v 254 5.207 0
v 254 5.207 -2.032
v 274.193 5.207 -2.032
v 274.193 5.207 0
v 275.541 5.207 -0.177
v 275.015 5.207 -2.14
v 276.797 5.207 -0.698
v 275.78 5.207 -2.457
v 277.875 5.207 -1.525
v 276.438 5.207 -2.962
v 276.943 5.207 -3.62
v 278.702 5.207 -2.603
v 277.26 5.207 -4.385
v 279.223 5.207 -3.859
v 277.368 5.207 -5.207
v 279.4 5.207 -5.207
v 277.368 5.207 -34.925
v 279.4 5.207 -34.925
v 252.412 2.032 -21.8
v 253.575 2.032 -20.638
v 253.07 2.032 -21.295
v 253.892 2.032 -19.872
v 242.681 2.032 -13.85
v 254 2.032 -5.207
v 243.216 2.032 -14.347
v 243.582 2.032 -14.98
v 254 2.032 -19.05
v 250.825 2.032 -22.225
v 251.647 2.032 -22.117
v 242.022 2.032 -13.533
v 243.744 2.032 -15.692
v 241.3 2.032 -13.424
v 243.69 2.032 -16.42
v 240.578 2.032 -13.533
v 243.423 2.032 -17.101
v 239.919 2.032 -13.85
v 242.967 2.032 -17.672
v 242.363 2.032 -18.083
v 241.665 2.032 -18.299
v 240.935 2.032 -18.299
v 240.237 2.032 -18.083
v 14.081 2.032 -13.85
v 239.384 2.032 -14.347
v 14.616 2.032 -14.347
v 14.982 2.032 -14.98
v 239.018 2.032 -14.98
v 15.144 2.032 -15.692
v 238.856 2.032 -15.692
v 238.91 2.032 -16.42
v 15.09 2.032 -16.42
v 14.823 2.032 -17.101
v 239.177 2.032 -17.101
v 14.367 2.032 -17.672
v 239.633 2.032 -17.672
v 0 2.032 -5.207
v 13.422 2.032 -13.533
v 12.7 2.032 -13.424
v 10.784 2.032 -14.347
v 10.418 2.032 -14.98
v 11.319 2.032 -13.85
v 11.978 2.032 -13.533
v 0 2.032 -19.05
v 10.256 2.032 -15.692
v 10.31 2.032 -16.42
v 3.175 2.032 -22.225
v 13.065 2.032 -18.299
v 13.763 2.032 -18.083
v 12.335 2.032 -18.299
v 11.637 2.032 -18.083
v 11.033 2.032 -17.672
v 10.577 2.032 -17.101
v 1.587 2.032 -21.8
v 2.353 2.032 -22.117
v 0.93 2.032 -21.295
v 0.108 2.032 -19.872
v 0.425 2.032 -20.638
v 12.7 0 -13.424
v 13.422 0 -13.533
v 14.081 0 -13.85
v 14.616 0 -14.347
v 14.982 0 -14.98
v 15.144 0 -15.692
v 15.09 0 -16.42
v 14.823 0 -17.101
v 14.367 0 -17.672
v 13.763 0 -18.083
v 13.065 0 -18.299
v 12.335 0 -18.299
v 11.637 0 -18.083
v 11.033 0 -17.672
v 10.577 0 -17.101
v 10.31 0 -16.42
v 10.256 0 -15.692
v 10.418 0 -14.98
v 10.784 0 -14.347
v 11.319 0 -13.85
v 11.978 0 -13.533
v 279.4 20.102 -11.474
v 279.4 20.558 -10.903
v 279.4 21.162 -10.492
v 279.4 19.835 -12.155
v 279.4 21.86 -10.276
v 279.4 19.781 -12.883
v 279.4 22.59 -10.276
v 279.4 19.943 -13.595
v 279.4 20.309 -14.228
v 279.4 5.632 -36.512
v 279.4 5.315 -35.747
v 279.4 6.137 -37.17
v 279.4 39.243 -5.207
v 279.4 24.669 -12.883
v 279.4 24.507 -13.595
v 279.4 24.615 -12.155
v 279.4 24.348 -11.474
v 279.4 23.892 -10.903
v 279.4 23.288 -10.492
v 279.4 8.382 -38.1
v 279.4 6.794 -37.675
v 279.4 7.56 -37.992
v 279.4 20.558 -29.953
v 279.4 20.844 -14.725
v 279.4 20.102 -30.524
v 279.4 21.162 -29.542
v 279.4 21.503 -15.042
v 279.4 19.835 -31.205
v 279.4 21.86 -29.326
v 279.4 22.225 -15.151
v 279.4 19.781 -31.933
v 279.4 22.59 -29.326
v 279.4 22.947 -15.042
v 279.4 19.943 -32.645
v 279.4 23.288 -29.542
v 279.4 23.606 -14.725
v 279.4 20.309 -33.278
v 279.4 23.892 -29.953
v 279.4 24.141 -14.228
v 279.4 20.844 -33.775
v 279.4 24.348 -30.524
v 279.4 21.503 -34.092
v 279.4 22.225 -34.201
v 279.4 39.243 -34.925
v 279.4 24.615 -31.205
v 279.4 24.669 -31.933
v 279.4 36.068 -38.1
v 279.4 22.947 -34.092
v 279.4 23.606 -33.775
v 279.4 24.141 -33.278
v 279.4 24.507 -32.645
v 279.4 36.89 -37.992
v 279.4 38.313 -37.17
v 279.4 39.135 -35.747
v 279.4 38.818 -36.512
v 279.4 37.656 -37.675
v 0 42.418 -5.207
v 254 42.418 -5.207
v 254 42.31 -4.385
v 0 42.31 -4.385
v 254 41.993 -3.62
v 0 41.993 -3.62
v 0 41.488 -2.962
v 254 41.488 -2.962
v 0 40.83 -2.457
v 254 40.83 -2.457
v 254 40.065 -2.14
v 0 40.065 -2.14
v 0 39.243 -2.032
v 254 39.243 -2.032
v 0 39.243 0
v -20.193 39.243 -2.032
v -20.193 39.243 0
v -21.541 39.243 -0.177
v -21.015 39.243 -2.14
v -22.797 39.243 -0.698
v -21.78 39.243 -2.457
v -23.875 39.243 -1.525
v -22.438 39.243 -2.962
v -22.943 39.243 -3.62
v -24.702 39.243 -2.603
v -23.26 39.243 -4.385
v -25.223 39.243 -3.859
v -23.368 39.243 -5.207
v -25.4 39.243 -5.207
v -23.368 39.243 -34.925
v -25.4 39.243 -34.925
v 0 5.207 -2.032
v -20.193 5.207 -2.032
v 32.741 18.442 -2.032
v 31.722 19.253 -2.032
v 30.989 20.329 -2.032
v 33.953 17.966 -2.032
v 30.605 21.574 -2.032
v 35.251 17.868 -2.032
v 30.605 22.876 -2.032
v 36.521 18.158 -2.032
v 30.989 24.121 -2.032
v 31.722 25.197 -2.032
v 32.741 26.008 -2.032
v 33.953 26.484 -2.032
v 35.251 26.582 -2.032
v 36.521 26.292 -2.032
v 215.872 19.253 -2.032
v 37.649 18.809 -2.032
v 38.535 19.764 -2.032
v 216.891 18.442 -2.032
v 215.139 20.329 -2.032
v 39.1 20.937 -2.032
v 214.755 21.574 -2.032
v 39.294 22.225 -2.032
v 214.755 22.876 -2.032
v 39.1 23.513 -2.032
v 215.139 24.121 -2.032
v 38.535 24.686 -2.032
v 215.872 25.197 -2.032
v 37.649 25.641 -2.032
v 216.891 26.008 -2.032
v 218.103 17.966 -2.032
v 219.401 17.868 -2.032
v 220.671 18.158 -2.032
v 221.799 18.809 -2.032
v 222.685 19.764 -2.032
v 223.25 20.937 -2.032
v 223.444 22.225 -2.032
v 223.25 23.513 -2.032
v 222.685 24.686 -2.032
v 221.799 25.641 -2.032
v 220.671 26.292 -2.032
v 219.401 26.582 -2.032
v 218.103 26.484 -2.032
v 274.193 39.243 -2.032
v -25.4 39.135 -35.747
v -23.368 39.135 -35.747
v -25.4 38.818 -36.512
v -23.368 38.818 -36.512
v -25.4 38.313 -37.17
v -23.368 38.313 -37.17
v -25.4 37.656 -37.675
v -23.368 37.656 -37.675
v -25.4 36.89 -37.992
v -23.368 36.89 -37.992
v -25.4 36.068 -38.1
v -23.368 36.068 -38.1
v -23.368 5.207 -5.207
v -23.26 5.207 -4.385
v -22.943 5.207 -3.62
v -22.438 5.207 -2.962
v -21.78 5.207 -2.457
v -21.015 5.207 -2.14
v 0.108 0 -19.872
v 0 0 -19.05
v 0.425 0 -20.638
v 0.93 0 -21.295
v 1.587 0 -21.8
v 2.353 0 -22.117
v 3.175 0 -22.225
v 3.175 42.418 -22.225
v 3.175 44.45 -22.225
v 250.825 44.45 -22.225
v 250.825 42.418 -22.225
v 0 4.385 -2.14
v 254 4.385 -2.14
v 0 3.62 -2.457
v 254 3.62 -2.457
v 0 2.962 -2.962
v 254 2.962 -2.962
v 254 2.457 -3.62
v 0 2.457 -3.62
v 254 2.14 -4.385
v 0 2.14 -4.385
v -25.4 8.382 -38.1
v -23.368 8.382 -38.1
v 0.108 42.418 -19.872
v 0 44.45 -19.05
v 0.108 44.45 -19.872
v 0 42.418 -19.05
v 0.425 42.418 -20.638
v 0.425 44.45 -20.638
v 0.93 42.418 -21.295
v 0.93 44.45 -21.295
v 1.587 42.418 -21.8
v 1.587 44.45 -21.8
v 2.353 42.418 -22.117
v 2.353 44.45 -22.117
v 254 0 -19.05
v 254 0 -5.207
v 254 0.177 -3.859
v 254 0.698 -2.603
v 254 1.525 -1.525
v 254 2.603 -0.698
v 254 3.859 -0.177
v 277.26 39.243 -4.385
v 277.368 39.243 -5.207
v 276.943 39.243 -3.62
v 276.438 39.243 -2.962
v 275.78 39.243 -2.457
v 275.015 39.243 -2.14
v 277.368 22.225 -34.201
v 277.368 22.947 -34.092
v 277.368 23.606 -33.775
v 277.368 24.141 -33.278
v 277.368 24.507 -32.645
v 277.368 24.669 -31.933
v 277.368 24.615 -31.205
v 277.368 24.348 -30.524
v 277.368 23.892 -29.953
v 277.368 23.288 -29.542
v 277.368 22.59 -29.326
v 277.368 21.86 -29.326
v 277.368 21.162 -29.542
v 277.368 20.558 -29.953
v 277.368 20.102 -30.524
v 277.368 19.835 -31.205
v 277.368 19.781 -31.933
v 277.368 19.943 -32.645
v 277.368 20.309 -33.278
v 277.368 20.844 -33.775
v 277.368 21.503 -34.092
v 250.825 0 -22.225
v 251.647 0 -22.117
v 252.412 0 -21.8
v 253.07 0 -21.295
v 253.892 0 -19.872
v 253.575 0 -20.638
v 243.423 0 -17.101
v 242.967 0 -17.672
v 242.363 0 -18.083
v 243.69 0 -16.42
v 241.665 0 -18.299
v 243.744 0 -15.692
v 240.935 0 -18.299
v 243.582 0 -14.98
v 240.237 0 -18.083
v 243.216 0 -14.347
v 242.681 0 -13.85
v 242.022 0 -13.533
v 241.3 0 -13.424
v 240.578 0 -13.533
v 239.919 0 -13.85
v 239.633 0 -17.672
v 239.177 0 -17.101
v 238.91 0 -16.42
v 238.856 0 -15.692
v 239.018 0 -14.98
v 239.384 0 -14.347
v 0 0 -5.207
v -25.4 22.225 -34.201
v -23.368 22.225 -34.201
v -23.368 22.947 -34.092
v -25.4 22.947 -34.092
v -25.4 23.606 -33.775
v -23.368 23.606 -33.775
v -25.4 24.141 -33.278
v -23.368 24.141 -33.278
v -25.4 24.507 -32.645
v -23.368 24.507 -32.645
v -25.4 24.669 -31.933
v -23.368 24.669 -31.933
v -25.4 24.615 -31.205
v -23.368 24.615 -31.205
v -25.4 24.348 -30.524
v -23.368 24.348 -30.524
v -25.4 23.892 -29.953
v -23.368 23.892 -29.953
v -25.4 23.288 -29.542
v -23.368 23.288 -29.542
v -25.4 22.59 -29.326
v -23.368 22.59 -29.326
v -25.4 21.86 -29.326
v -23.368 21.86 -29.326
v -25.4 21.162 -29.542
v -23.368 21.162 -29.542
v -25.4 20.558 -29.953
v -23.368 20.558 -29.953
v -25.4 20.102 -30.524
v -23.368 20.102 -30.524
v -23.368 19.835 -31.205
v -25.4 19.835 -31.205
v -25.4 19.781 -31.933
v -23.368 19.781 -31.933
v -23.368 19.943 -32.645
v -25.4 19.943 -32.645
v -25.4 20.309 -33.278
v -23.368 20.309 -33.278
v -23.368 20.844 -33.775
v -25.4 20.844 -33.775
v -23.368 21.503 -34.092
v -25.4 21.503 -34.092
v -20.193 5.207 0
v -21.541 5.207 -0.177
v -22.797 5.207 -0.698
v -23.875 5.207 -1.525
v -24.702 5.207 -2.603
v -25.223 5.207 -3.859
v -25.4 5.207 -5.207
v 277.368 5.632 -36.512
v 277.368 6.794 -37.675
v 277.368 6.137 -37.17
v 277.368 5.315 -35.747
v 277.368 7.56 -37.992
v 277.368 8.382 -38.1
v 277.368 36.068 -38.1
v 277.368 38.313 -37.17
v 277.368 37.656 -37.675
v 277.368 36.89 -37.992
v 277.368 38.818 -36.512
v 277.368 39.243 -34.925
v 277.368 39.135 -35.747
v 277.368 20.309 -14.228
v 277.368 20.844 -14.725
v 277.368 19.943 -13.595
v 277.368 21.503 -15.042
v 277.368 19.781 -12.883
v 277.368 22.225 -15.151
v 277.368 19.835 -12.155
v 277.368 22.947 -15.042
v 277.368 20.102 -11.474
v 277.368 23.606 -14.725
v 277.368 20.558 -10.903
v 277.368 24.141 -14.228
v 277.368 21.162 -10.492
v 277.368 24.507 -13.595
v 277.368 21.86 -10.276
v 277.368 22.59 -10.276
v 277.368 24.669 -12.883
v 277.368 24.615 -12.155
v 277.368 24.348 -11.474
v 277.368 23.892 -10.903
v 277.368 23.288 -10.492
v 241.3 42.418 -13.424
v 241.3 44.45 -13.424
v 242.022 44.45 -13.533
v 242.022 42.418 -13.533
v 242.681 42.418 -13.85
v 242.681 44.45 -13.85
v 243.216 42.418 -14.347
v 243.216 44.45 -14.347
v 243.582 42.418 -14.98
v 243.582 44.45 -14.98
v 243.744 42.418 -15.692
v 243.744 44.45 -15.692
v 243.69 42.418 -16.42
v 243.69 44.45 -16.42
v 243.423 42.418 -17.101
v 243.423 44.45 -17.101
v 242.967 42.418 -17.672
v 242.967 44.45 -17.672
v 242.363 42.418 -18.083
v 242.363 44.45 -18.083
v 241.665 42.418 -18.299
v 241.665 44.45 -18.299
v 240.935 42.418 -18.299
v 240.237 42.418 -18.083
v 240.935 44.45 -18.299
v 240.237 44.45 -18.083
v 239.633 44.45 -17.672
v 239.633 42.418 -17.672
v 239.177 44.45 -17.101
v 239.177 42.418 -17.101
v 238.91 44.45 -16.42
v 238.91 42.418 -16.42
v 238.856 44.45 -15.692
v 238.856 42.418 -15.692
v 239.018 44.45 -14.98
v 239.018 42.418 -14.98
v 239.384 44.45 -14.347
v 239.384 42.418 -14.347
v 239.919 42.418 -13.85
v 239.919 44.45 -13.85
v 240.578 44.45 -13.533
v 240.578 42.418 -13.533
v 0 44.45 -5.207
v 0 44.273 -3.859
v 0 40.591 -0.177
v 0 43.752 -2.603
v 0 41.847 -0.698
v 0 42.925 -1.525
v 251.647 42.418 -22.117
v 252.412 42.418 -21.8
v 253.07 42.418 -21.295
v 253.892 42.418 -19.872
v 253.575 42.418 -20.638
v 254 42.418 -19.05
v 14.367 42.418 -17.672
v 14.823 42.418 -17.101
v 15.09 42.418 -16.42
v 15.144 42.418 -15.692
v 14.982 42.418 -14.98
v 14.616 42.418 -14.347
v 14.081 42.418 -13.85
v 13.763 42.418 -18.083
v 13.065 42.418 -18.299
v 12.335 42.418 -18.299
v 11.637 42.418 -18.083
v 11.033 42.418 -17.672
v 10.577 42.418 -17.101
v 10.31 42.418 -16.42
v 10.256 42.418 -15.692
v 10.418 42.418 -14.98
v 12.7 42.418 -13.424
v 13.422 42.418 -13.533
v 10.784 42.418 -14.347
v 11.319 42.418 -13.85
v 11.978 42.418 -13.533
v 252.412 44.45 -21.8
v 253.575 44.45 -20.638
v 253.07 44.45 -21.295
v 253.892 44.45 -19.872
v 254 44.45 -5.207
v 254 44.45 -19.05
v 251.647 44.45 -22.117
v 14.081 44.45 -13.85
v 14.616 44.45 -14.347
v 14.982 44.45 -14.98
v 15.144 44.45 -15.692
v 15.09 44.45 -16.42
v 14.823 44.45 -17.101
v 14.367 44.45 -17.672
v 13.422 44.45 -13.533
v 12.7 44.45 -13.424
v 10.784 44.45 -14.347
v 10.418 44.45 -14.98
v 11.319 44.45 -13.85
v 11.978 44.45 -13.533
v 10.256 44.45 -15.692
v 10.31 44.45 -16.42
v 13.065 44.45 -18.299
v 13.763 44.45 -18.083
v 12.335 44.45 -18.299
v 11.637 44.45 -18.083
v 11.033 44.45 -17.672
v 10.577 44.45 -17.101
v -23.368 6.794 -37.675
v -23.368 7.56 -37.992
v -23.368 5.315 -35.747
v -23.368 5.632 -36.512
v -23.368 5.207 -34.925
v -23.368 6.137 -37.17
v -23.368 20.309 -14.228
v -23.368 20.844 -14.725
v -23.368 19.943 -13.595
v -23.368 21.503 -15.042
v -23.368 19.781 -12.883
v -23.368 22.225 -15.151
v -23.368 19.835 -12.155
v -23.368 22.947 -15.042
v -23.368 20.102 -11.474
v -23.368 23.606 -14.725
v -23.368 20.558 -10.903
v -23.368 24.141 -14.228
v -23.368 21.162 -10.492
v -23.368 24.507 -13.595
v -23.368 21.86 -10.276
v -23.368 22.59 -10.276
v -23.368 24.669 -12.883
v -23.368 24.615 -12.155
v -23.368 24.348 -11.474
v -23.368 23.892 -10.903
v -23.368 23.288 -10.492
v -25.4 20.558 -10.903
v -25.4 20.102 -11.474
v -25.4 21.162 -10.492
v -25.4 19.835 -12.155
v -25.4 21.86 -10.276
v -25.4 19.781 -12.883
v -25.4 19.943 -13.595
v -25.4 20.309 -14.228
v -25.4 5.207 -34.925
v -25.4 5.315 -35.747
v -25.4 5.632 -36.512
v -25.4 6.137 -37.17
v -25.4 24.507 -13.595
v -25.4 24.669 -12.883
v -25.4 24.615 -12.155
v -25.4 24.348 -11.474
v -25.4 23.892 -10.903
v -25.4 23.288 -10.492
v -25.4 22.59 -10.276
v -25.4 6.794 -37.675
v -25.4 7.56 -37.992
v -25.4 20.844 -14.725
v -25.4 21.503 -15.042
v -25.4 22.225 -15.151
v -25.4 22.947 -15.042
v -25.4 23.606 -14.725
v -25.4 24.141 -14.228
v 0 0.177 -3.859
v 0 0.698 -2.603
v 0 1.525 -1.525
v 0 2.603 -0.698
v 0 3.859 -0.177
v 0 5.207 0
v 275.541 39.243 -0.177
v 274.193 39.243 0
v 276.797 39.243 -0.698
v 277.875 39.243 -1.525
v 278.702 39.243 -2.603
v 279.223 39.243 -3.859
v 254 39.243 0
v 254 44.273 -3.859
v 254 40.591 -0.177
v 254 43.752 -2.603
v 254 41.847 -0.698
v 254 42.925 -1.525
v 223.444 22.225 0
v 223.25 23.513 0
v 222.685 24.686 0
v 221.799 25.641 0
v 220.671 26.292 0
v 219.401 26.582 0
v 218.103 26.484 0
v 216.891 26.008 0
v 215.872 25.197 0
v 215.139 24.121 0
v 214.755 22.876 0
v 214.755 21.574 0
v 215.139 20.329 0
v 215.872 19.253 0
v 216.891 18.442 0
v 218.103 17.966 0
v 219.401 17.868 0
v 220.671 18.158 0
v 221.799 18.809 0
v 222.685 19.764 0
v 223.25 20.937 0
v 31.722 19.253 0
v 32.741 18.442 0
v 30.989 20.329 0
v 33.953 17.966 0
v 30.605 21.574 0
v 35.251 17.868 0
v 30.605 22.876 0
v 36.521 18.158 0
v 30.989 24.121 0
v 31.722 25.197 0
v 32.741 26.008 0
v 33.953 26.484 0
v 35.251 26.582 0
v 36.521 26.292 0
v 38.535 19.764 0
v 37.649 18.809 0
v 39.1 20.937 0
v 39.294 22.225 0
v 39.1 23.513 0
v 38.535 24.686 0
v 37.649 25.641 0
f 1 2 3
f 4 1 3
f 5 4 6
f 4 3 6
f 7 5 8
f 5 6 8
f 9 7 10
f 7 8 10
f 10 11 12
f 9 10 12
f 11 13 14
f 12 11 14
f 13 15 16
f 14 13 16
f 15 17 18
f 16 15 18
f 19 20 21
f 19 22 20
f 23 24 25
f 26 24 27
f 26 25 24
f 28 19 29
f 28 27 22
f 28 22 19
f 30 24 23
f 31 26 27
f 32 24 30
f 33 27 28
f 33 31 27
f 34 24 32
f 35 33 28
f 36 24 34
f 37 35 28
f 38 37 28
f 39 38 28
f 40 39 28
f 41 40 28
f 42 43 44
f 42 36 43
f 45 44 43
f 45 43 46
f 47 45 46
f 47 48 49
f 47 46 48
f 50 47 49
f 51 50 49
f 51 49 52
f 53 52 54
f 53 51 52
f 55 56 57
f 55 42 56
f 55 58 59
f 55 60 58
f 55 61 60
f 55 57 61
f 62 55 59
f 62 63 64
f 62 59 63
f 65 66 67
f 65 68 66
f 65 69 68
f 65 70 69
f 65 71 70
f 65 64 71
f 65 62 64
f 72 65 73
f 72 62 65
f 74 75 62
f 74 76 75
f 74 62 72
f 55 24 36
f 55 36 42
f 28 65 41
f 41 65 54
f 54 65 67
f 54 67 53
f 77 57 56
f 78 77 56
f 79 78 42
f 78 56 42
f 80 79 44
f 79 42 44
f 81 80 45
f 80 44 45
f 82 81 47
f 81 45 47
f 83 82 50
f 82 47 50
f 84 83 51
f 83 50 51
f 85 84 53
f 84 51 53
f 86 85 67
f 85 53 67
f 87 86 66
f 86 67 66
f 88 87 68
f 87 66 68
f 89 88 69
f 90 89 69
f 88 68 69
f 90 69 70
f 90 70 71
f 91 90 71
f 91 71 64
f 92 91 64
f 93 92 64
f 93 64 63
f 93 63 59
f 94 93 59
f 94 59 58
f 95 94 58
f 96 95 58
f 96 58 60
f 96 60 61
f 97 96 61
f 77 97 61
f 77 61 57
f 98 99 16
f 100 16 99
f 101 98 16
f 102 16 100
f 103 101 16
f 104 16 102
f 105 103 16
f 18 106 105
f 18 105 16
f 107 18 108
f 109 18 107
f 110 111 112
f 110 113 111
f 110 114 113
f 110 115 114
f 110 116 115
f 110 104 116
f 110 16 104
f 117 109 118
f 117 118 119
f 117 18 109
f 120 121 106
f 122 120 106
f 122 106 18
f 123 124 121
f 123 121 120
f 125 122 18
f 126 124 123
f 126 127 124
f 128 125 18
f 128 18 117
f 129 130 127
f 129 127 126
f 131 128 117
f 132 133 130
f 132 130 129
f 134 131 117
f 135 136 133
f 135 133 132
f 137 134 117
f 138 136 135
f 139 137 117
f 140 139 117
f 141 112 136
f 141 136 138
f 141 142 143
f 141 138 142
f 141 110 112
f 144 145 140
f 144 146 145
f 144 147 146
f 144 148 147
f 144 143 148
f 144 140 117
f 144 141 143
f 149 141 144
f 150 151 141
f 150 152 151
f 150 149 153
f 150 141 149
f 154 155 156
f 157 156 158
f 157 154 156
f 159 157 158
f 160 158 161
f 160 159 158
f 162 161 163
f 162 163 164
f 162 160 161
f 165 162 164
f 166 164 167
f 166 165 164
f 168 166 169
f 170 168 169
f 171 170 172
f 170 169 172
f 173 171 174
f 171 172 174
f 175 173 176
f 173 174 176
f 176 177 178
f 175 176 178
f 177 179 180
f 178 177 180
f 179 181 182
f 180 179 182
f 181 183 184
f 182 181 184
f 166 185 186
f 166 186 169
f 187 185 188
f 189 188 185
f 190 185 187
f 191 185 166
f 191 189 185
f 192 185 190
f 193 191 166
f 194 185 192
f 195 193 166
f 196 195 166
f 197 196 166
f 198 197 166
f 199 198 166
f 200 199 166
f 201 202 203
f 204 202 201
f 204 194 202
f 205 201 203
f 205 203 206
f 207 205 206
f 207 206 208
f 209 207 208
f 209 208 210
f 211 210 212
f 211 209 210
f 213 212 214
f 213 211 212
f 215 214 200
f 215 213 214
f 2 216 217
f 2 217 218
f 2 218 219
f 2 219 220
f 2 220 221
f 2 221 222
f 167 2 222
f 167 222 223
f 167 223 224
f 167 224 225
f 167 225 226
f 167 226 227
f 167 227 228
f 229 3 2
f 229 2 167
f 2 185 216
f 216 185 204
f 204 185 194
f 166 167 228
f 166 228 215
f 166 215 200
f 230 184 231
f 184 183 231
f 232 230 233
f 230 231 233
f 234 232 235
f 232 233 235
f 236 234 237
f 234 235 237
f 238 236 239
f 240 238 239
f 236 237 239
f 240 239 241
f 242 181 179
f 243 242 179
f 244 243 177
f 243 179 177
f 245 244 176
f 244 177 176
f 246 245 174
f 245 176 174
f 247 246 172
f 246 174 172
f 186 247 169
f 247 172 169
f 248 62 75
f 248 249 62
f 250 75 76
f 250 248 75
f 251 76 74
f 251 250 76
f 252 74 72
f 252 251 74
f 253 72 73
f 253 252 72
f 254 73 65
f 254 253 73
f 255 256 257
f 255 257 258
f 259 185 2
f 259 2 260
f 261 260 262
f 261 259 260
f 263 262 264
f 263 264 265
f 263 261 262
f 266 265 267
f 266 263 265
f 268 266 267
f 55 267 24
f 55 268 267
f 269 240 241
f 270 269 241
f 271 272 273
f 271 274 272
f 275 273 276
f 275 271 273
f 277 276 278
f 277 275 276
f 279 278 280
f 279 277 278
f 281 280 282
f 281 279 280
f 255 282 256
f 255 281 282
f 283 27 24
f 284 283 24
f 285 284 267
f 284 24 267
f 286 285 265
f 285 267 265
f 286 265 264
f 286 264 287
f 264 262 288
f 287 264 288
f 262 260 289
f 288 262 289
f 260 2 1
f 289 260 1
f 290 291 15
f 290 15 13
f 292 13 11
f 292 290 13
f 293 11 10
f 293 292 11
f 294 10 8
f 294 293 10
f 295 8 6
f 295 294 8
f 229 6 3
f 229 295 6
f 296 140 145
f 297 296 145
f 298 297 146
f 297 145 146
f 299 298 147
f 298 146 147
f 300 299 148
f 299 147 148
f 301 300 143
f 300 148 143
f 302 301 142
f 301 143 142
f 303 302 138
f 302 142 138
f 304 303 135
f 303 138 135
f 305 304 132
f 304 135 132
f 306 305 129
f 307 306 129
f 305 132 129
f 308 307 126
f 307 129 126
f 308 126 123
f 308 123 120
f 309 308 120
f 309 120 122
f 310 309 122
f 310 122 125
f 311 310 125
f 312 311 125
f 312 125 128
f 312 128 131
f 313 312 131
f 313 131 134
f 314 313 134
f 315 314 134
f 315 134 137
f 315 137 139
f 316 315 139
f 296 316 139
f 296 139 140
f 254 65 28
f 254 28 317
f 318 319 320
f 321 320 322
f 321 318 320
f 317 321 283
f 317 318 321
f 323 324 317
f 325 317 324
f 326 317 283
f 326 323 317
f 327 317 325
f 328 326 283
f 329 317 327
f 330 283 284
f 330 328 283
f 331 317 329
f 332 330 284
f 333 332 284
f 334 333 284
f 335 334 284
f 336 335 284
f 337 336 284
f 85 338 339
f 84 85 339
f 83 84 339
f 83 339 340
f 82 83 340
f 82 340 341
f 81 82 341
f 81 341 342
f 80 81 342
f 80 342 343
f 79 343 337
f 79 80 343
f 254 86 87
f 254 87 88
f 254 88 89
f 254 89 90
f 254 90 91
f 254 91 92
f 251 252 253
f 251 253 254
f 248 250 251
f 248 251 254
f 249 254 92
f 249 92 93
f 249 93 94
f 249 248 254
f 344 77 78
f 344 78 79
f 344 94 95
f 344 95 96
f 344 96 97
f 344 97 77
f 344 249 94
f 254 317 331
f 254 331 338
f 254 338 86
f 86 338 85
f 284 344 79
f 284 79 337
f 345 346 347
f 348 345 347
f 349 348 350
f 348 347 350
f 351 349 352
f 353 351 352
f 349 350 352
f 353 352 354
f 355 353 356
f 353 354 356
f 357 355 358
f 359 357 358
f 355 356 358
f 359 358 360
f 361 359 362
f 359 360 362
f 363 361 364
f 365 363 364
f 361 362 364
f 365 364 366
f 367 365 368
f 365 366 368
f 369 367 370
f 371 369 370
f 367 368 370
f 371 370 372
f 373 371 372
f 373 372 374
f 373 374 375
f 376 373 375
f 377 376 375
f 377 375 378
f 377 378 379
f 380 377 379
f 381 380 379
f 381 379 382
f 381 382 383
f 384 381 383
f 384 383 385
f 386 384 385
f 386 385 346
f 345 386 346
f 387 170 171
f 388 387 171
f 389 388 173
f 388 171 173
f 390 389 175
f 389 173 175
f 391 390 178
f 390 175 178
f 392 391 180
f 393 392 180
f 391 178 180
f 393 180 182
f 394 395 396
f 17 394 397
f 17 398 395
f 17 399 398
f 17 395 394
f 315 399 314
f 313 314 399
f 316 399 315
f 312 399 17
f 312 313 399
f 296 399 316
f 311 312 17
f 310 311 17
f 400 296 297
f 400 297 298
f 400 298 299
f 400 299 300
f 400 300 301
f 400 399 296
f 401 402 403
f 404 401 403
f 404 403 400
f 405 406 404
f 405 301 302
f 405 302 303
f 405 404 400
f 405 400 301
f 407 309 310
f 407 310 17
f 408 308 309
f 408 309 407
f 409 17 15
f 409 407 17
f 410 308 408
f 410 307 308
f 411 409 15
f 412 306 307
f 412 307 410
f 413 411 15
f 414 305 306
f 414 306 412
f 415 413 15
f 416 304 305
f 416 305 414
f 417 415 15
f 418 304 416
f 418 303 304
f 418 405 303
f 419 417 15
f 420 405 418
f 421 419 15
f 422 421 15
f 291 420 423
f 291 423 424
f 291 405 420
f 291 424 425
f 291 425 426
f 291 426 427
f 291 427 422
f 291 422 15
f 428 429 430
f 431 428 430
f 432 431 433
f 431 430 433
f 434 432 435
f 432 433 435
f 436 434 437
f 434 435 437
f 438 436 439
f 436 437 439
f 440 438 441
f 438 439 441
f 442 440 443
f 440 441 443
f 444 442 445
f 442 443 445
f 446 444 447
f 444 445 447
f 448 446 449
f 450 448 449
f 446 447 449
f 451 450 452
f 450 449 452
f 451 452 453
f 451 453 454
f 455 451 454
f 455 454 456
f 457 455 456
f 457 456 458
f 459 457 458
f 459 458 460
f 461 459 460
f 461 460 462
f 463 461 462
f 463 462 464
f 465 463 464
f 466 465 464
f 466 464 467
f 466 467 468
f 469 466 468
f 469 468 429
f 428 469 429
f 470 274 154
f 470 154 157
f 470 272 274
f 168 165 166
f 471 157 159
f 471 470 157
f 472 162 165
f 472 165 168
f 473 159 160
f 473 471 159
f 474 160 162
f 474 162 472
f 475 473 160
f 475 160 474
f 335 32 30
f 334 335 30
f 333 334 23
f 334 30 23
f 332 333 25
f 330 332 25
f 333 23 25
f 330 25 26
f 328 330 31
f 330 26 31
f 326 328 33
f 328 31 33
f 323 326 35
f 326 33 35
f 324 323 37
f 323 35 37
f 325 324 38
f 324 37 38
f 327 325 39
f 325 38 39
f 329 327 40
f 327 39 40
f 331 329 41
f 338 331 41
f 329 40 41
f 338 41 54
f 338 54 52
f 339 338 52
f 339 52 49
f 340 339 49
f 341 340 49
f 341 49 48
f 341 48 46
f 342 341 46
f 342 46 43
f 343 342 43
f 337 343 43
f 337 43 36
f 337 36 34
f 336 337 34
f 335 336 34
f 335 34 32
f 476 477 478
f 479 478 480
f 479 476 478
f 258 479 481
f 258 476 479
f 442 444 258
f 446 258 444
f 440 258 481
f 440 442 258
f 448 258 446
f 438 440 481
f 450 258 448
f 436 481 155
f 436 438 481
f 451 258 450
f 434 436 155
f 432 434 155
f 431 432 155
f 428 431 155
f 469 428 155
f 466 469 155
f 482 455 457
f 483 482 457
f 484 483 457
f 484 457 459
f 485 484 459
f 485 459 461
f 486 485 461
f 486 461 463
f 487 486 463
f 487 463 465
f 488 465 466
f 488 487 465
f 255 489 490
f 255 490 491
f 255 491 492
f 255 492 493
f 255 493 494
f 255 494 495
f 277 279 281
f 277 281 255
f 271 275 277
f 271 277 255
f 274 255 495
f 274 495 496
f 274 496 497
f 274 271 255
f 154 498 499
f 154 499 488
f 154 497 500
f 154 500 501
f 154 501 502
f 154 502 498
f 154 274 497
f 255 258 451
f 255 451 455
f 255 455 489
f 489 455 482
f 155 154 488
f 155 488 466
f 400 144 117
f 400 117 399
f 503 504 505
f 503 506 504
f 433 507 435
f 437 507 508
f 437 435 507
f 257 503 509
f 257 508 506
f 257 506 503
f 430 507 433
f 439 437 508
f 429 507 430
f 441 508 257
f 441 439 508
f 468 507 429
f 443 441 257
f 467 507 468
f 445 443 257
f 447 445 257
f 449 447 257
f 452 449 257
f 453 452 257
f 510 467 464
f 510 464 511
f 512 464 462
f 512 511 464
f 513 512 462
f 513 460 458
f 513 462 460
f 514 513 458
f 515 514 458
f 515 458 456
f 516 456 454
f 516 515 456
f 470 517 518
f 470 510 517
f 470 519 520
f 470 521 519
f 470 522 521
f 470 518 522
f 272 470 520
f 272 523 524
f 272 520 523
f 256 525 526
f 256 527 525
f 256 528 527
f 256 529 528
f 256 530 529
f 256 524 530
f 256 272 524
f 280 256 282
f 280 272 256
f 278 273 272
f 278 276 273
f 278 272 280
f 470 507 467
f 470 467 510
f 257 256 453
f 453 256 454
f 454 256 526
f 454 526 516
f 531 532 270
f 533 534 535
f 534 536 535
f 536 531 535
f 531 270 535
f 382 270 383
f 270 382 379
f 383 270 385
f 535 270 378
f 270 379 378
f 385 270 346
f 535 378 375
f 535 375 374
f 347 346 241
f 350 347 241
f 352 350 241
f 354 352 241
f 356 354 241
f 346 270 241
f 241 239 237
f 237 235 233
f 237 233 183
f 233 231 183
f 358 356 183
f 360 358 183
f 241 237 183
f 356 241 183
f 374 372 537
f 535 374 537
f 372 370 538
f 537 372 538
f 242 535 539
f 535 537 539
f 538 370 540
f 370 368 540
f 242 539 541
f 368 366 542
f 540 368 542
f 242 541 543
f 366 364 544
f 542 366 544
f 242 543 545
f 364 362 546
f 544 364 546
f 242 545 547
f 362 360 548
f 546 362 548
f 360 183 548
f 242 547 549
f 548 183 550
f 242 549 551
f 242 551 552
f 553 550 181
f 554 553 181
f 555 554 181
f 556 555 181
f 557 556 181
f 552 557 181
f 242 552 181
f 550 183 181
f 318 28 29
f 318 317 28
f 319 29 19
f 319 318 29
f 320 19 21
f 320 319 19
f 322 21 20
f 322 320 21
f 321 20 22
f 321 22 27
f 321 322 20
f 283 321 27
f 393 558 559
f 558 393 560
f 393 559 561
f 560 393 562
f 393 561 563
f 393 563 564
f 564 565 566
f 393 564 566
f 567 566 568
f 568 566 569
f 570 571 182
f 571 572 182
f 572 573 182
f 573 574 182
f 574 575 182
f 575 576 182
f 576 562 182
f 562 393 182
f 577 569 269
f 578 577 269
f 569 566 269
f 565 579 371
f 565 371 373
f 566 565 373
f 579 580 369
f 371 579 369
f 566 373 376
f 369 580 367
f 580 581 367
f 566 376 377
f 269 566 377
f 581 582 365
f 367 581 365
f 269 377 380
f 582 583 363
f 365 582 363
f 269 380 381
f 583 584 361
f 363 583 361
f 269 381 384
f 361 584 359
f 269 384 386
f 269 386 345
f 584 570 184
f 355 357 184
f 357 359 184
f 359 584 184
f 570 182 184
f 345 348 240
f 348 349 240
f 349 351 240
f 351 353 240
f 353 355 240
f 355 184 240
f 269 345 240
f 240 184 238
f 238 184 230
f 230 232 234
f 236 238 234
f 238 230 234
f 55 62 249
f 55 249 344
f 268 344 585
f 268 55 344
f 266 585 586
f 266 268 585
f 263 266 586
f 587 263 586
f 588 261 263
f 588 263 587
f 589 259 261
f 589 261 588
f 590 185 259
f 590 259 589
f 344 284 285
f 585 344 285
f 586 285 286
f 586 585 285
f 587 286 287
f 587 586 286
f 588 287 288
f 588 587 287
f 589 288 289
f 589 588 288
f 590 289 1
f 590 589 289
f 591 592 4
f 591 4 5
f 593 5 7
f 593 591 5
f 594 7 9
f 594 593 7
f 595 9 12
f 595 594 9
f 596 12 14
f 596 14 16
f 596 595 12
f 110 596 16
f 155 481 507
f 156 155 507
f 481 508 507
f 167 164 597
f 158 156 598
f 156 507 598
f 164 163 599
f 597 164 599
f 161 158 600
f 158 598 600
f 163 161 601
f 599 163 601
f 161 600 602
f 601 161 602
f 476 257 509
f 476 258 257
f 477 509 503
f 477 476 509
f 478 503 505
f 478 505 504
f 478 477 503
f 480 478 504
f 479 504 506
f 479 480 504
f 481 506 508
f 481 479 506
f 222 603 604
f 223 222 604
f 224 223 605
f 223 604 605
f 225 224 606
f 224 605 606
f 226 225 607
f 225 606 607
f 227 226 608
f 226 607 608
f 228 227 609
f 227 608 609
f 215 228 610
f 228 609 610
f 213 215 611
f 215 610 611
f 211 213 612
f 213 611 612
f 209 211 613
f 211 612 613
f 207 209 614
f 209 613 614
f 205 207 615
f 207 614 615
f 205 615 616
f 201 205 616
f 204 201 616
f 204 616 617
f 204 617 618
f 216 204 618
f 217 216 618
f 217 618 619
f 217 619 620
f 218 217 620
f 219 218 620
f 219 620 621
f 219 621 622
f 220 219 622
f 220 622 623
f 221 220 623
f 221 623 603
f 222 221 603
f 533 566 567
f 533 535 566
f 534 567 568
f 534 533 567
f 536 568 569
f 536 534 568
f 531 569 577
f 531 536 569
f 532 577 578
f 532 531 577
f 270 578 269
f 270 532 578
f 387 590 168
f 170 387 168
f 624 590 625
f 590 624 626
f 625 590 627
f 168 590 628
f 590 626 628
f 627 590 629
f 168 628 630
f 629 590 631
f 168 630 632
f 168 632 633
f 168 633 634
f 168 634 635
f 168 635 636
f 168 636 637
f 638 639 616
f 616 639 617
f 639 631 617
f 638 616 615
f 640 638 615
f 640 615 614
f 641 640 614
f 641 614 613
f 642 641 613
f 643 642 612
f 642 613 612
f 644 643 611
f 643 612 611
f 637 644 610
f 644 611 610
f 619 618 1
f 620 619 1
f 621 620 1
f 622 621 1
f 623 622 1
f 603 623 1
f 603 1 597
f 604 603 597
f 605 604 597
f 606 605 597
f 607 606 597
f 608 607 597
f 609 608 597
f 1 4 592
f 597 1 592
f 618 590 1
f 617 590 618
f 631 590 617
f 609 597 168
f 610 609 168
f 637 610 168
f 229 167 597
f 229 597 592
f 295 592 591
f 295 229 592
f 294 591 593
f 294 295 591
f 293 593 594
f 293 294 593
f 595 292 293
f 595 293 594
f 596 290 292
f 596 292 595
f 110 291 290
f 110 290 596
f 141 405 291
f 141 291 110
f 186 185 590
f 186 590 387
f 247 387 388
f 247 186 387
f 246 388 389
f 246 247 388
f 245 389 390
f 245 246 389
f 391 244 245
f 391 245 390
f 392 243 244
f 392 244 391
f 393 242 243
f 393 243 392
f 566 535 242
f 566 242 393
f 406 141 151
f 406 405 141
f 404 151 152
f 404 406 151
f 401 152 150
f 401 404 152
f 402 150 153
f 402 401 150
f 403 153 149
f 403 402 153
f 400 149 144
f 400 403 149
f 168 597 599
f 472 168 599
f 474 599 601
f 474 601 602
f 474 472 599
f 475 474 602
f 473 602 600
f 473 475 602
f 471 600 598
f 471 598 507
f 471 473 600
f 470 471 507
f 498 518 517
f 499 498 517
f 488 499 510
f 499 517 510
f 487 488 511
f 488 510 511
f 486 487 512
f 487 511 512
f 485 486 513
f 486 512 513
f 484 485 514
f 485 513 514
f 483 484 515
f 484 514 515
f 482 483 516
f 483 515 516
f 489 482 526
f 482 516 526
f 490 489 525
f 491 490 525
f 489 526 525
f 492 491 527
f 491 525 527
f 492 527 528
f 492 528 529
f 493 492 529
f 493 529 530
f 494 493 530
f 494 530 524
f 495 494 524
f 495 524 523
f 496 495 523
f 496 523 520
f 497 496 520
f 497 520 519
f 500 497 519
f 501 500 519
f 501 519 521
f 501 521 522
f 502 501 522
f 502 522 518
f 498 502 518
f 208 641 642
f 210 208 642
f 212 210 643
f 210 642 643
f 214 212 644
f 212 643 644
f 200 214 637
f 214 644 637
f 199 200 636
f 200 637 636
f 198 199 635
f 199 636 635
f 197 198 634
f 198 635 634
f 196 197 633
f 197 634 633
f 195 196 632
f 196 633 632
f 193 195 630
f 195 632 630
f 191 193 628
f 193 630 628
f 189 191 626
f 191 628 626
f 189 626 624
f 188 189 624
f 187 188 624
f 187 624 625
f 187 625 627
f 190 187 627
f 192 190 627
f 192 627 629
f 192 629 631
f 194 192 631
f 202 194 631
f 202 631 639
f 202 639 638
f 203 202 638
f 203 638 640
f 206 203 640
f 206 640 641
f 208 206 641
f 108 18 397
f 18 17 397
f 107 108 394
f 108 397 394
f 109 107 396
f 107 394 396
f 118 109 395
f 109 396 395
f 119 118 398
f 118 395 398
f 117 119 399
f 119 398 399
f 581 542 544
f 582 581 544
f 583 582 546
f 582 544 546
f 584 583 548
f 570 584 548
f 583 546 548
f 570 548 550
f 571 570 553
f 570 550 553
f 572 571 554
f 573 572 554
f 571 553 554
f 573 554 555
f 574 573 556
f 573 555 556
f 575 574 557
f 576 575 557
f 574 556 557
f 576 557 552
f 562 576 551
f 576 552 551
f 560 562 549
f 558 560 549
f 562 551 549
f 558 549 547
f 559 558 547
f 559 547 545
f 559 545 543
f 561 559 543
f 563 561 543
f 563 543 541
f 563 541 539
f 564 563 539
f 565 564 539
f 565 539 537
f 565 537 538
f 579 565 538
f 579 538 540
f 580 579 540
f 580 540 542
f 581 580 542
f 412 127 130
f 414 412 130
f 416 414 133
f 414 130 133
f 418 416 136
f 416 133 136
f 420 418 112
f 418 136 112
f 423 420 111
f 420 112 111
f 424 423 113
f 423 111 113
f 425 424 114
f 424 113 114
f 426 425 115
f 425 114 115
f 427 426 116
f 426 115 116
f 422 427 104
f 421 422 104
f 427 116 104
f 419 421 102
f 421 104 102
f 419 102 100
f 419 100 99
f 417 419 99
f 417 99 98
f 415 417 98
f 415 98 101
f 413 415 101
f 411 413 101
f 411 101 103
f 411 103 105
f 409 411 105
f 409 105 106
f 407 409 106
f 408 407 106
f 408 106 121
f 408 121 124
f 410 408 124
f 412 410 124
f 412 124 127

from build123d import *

# Parameters (mm, degrees)
BASE_FLANGE1_DEPTH           = 254
SKETCH6_W                    = 2.032
SKETCH6_H                    = 34.036
BOSS_EXTRUDE1_DEPTH          = 25.4
EDGE_FLANGE1_STRIP_W         = 14.478
EDGE_FLANGE1_STRIP_H         = 2.032
EDGE_FLANGE1_STRIP_CUT_DEPTH = 34.036
EDGE_FLANGE1_DEPTH           = 34.036
SKETCH10_R                   = 2.4511
CUT_EXTRUDE1_DEPTH           = 311.37147501
SKETCH11_R                   = 2.4511
CUT_EXTRUDE2_DEPTH           = 286.467638271
SKETCH12_R                   = 4.3688
CUT_EXTRUDE3_DEPTH           = 286.467638271
FILLET1_R                    = 3.175


# Sheet-metal steps are written as plain solids
with BuildPart() as part:
    # Sketch1 → Base-Flange1 (new body)
    with BuildSketch(Plane(origin=(0, 0, 0), x_dir=(0, 0, -1), z_dir=(1, 0, 0))):
        with BuildLine():
            Line((22.225, 0), (5.207, 0))
            ThreePointArc((5.207, 0), (1.52509499, 1.52509499), (0, 5.207))
            Line((0, 5.207), (0, 39.243))
            ThreePointArc((0, 39.243), (1.52509499, 42.92490501), (5.207, 44.45))
            Line((5.207, 44.45), (22.225, 44.45))
            Line((22.225, 44.45), (22.225, 42.418))
            Line((22.225, 42.418), (5.207, 42.418))
            ThreePointArc((5.207, 42.418), (2.96193597, 41.48806403), (2.032, 39.243))
            Line((2.032, 39.243), (2.032, 5.207))
            ThreePointArc((2.032, 5.207), (2.96193597, 2.96193597), (5.207, 2.032))
            Line((5.207, 2.032), (22.225, 2.032))
            Line((22.225, 2.032), (22.225, 0))
        make_face()
    extrude(amount=BASE_FLANGE1_DEPTH)

    # Sketch6 → Boss-Extrude1 (add)
    with BuildSketch(Plane(origin=(254, 0, 0), x_dir=(0, 0, -1), z_dir=(1, 0, 0))):
        with Locations((1.016, 22.225)):
            Rectangle(SKETCH6_W, SKETCH6_H)
    boss_extrude1 = extrude(amount=BOSS_EXTRUDE1_DEPTH)

    # Edge-Flange1 strip (across the edge) → Edge-Flange1 strip cut (cut)
    with BuildSketch(Plane(origin=(279.4, 39.243, -2.032), x_dir=(-1, 0, 0), z_dir=(0, -1, 0))):
        with Locations((-2.032, -1.016)):
            Rectangle(EDGE_FLANGE1_STRIP_W, EDGE_FLANGE1_STRIP_H)
    edge_flange1_strip_cut = extrude(amount=EDGE_FLANGE1_STRIP_CUT_DEPTH, mode=Mode.SUBTRACT)

    # Edge-Flange1 section (across the edge) → Edge-Flange1 (add)
    with BuildSketch(Plane(origin=(279.4, 39.243, -2.032), x_dir=(-1, 0, 0), z_dir=(0, -1, 0))):
        with BuildLine():
            Line((0, 3.175), (0, 36.068))
            Line((0, 36.068), (2.032, 36.068))
            Line((2.032, 36.068), (2.032, 3.175))
            ThreePointArc((2.032, 3.175), (2.96193597, 0.92993597), (5.207, 0))
            Line((5.207, 0), (5.207, -2.032))
            ThreePointArc((5.207, -2.032), (1.52509499, -0.50690501), (0, 3.175))
        make_face()
    edge_flange1 = extrude(amount=EDGE_FLANGE1_DEPTH)

    # Mirror1: Boss-Extrude1, Edge-Flange1 strip cut, Edge-Flange1 across plane
    add(boss_extrude1.mirror(Plane(origin=(127, 0, 0), x_dir=(0, 0, 1), z_dir=(1, 0, 0))))
    add(edge_flange1_strip_cut.mirror(Plane(origin=(127, 0, 0), x_dir=(0, 0, 1), z_dir=(1, 0, 0))), mode=Mode.SUBTRACT)
    add(edge_flange1.mirror(Plane(origin=(127, 0, 0), x_dir=(0, 0, 1), z_dir=(1, 0, 0))))

    # Sketch10 → Cut-Extrude1 (cut, through all)
    with BuildSketch(Plane(origin=(279.4, 0, 0), x_dir=(0, 0, -1), z_dir=(1, 0, 0))):
        with Locations((12.7, 22.225)):
            Circle(SKETCH10_R)
        with Locations((31.75, 22.225)):
            Circle(SKETCH10_R)
    extrude(amount=-CUT_EXTRUDE1_DEPTH, mode=Mode.SUBTRACT)

    # Sketch11 → Cut-Extrude2 (cut, through all)
    with BuildSketch(Plane(origin=(0, 44.45, 0), x_dir=(1, 0, 0), z_dir=(0, 1, 0))):
        with Locations(Location((12.7, 15.875, 0), (0, 0, 270))):
            Circle(SKETCH11_R)
        with Locations(Location((241.3, 15.875, 0), (0, 0, 270))):
            Circle(SKETCH11_R)
    extrude(amount=-CUT_EXTRUDE2_DEPTH, mode=Mode.SUBTRACT)

    # Sketch12 → Cut-Extrude3 (cut, through all)
    with BuildSketch(Plane.XY):
        with Locations((34.925, 22.225)):
            Circle(SKETCH12_R)
        with Locations((219.075, 22.225)):
            Circle(SKETCH12_R)
    extrude(amount=-CUT_EXTRUDE3_DEPTH, mode=Mode.SUBTRACT)

    # Fillet1
    fillet1_edges = [part.edges().sort_by_distance(p)[0] for p in [
        (-24.384, 5.207, -38.1),
        (0, 1.016, -22.225),
        (-24.384, 39.243, -38.1),
        (0, 43.434, -22.225),
        (254, 1.016, -22.225),
        (278.384, 39.243, -38.1),
        (278.384, 5.207, -38.1),
        (254, 43.434, -22.225),
    ]]
    fillet(fillet1_edges, radius=FILLET1_R)


solid = part.part
